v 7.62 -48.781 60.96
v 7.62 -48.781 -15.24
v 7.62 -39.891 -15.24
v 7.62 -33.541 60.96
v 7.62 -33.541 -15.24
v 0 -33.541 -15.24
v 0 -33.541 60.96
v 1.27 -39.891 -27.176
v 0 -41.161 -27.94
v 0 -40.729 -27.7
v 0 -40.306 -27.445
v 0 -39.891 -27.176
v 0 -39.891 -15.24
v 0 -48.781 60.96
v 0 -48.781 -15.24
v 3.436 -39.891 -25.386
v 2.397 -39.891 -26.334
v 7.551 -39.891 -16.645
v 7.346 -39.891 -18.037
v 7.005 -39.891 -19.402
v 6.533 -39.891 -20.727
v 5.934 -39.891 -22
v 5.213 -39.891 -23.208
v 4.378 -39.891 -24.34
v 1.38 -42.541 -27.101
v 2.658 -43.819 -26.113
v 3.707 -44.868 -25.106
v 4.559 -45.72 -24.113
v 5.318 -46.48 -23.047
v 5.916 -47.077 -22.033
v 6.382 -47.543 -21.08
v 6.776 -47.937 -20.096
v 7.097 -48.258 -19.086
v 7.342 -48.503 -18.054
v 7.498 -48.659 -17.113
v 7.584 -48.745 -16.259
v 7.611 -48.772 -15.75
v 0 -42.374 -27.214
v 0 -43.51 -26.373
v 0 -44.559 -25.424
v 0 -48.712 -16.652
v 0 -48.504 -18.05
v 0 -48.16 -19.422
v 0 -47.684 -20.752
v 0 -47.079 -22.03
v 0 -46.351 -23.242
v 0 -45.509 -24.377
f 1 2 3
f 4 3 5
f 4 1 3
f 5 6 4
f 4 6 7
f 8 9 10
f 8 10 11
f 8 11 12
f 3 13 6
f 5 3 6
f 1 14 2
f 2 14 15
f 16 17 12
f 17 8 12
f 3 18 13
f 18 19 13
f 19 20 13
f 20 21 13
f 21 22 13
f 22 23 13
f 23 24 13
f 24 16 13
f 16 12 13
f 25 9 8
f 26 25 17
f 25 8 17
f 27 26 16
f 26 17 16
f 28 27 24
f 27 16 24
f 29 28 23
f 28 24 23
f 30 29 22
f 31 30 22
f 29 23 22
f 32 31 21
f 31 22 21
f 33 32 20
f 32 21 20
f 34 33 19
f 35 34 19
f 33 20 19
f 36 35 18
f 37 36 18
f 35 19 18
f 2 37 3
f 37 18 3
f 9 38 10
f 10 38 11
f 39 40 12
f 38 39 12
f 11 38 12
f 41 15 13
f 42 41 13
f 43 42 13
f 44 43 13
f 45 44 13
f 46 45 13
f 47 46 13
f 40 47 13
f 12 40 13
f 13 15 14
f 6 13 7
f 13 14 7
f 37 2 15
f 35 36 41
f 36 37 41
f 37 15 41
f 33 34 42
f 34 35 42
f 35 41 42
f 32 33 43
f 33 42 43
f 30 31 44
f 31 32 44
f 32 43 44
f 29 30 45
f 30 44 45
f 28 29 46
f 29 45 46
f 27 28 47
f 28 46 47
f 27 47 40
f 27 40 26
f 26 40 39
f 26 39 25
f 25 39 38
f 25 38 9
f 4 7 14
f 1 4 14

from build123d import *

# Parameters (mm, degrees)
F1_DEPTH = 7.62
F3_DEPTH = 25.4


with BuildPart() as f1:
    # F0 (on Right) → F1 (new body)
    with BuildSketch(Plane.YZ):
        Polygon((-33.541034, 60.960074), (-48.781034, 60.960074), (-48.781034, -15.239926), (-42.431034, -15.239926), (-39.891034, -15.239926), (-33.541034, -15.239926), align=None)
        with BuildLine():
            Line((-42.431034, -15.239926), (-48.781034, -15.239926))
            ThreePointArc((-48.781034, -15.239926), (-46.729882, -22.645235), (-41.161034, -27.939926))
            ThreePointArc((-41.161034, -27.939926), (-40.516197, -27.574381), (-39.891034, -27.176124))
            Line((-39.891034, -27.176124), (-39.891034, -15.239926))
            Line((-39.891034, -15.239926), (-42.431034, -15.239926))
        make_face()
    extrude(amount=F1_DEPTH)

    # F2 (on face) → F3 (cut)
    with BuildSketch(Plane(origin=(0, -33.541034, 0), x_dir=(-1, 0, 0), z_dir=(0, 1, 0))):
        with BuildLine():
            ThreePointArc((0, -27.939926), (-5.568848, -22.645235), (-7.62, -15.239926))
            Line((-7.62, -15.239926), (-7.62, -27.939926))
            Line((-7.62, -27.939926), (0, -27.939926))
        make_face()
    extrude(amount=-F3_DEPTH, mode=Mode.SUBTRACT)


solid = f1.part
